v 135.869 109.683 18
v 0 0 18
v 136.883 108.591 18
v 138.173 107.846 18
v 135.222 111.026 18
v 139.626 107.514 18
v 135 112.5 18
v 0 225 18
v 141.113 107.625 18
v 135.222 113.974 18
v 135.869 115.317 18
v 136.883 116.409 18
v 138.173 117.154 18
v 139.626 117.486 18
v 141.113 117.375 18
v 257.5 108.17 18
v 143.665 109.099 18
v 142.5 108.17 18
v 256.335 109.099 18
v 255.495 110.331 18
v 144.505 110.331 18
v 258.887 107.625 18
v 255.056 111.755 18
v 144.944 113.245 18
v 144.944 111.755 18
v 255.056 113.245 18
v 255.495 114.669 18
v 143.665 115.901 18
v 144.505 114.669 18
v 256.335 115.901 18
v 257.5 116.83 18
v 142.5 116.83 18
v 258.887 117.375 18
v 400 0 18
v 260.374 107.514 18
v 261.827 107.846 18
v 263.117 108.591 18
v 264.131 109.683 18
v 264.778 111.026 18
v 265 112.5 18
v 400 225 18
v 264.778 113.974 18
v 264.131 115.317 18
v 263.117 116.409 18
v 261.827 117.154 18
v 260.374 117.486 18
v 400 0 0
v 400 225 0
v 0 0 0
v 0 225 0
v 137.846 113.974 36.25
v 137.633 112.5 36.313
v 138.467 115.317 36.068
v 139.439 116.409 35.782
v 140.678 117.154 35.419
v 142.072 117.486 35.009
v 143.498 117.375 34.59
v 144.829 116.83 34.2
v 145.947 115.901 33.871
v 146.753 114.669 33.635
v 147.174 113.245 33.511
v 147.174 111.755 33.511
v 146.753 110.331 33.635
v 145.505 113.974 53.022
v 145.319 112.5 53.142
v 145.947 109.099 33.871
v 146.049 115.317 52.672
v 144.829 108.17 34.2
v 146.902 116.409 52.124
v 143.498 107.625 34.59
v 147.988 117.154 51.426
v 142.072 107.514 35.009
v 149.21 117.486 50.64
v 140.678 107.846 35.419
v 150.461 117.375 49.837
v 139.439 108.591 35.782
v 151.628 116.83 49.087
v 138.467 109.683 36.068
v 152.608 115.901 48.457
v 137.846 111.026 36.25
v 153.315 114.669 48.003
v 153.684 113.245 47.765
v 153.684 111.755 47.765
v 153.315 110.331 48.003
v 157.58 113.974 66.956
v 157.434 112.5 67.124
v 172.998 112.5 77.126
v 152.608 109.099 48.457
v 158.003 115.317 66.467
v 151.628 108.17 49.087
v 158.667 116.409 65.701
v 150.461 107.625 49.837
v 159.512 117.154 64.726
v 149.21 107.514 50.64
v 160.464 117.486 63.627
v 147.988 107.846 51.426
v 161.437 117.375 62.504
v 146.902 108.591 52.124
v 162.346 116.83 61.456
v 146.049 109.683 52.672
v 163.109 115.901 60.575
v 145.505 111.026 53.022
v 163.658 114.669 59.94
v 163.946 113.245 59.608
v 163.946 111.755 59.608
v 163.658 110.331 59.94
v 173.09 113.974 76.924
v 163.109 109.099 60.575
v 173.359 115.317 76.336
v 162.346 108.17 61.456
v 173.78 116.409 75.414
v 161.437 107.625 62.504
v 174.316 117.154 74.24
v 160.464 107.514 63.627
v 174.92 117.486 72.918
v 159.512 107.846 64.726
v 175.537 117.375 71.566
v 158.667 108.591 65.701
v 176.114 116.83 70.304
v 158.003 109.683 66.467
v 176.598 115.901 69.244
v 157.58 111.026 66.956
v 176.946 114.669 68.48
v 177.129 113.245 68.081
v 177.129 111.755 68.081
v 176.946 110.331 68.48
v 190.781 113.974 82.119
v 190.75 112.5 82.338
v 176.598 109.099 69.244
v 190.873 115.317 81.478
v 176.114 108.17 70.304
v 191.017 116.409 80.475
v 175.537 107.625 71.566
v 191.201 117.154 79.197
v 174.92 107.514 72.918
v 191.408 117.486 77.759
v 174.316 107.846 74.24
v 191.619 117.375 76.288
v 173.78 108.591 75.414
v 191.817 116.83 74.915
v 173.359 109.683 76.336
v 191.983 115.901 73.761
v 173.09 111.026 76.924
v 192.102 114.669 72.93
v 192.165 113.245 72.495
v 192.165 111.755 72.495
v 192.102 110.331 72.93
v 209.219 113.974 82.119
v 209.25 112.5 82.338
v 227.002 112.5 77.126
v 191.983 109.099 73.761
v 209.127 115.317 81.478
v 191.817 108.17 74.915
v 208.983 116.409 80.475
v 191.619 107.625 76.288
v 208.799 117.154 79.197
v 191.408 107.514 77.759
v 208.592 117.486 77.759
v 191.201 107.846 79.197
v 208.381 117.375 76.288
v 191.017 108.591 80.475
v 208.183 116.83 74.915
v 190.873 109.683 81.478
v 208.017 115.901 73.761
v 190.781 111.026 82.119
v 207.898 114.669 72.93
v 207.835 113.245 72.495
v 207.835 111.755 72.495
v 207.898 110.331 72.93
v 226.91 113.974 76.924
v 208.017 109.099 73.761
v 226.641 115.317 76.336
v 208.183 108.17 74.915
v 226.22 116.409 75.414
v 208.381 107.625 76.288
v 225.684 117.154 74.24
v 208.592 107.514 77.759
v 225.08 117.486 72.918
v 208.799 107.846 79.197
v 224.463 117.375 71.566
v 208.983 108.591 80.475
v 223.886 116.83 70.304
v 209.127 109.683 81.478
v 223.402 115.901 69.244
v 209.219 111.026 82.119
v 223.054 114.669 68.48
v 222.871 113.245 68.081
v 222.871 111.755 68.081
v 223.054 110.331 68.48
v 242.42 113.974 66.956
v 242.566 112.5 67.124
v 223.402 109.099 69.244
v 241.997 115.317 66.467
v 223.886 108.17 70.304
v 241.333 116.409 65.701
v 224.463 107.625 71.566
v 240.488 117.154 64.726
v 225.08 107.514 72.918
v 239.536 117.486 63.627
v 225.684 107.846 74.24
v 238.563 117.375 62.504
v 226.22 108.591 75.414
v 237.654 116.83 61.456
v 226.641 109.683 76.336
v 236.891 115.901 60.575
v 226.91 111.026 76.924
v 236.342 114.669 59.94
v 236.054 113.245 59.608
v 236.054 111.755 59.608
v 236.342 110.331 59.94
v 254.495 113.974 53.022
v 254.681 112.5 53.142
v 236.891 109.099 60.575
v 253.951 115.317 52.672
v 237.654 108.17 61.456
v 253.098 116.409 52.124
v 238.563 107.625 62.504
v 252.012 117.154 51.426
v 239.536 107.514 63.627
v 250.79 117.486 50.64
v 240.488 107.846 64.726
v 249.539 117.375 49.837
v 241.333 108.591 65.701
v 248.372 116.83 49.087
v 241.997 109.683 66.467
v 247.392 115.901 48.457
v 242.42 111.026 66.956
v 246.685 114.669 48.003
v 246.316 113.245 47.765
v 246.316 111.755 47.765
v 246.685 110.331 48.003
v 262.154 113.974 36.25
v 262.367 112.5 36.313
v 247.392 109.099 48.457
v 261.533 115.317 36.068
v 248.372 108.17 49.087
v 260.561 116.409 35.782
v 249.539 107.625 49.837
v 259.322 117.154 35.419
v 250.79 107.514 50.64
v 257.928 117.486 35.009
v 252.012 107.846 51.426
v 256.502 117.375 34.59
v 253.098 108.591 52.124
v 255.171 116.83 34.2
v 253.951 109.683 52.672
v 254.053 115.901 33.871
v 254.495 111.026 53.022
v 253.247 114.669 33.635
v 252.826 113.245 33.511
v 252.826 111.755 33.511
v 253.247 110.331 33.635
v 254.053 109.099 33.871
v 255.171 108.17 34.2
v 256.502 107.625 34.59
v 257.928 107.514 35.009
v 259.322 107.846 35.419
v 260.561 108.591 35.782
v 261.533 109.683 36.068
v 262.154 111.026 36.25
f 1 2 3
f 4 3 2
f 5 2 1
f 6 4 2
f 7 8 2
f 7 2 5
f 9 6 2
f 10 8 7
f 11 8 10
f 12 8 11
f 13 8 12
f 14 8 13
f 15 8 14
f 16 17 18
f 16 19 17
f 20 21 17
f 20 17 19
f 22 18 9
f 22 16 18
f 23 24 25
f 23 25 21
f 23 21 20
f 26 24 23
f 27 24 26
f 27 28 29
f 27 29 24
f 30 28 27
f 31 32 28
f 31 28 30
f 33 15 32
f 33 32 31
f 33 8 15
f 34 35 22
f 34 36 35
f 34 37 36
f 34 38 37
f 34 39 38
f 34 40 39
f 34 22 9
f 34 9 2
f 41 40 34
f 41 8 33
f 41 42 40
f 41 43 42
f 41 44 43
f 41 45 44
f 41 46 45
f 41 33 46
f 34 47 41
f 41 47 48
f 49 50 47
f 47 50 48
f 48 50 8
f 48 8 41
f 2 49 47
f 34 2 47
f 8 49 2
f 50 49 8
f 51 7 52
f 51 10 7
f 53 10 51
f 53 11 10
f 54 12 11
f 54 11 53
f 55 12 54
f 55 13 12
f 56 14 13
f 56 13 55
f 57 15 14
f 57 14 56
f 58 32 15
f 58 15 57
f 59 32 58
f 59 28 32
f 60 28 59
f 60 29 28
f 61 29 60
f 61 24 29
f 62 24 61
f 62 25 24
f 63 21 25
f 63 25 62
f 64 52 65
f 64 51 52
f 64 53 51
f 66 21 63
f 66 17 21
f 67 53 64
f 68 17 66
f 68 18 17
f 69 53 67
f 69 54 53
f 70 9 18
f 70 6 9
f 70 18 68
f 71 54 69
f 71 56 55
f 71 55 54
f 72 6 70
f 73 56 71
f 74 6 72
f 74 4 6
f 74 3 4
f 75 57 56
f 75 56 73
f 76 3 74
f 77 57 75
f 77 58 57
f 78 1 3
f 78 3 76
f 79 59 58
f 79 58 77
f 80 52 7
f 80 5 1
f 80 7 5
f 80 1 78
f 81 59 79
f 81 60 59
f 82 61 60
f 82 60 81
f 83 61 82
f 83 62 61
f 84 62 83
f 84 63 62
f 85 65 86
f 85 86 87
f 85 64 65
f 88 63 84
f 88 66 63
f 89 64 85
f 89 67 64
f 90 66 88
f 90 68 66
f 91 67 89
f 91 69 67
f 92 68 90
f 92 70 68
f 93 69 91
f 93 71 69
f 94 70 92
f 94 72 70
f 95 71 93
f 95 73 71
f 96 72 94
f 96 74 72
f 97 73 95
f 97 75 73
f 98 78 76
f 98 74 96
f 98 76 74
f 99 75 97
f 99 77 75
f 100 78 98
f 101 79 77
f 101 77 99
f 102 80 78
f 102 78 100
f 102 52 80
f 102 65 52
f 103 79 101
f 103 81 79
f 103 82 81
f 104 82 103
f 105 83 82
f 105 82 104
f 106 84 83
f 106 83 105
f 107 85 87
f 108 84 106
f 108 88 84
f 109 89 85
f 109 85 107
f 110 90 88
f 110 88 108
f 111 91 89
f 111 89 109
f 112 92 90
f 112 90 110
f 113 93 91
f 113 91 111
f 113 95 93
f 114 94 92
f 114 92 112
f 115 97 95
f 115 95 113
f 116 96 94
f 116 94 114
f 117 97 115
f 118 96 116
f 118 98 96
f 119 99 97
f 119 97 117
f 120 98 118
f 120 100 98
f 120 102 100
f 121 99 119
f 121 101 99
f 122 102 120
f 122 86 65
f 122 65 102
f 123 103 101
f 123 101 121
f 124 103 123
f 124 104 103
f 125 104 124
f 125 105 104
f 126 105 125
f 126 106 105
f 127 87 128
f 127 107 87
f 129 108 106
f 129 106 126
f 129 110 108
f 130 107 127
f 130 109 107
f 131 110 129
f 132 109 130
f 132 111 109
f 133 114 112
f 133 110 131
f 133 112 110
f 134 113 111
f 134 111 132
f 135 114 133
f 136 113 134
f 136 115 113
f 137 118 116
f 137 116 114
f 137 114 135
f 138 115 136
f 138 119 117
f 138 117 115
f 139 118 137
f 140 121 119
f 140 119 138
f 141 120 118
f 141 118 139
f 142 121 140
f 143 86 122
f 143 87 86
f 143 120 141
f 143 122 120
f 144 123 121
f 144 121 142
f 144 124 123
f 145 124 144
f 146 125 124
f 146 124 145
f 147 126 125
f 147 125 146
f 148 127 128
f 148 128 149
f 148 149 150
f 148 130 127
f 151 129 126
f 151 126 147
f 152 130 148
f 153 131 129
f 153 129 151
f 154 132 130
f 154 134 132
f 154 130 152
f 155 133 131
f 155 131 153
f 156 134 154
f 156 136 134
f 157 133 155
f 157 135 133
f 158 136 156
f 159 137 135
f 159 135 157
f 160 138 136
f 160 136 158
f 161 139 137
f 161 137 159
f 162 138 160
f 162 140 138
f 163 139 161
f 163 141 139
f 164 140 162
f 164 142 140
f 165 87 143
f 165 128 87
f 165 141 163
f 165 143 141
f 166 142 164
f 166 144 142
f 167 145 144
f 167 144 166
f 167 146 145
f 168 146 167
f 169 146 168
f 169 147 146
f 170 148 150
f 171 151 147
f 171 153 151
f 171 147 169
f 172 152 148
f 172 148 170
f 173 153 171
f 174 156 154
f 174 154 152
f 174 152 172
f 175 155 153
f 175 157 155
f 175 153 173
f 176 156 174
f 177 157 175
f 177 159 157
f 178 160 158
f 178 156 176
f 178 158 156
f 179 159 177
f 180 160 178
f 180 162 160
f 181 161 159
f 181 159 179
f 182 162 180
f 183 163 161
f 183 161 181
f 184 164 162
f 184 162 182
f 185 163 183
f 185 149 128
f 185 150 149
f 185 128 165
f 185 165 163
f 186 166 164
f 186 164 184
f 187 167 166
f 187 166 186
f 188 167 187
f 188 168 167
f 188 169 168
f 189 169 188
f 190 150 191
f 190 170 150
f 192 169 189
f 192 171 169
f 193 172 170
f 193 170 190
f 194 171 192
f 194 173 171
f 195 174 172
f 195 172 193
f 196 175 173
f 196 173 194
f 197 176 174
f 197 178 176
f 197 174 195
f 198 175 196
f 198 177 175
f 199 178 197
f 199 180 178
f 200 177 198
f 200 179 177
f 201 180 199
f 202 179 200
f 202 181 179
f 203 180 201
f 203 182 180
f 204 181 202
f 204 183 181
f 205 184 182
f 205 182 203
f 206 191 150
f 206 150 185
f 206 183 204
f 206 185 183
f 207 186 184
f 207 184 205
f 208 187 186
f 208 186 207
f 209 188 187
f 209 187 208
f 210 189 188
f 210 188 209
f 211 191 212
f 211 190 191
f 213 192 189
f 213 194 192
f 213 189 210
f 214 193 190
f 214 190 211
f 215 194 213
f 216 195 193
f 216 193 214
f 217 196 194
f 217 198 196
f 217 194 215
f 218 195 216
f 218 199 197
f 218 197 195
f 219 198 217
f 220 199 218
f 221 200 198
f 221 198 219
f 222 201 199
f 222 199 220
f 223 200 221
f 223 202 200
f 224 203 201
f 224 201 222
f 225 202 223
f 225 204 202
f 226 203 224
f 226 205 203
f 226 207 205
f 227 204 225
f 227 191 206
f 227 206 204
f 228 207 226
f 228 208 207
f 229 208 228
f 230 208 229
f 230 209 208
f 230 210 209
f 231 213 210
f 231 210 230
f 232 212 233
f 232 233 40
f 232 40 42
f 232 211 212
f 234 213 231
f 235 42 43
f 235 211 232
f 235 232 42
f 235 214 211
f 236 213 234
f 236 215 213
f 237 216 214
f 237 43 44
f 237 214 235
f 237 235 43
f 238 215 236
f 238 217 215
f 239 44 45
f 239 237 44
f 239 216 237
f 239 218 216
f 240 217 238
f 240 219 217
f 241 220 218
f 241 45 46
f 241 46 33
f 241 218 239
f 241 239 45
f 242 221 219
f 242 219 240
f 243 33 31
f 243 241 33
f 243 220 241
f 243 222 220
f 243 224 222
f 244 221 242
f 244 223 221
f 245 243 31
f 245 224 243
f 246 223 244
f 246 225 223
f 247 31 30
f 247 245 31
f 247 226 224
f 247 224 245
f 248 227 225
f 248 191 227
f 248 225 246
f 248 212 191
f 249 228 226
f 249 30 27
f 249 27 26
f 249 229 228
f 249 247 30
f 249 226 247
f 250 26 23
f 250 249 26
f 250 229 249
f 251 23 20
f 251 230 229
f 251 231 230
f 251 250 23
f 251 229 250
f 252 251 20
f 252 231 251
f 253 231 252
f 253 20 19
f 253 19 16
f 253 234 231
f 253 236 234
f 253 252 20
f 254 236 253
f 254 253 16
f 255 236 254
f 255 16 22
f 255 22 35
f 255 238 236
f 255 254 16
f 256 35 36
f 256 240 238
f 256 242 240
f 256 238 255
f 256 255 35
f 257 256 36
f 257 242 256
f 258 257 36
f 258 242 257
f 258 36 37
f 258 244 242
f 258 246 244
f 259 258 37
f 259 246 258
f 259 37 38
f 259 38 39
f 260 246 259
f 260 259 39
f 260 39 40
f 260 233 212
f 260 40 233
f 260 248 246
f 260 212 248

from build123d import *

# Parameters (mm, degrees)
SKETCH1_W           = 400
SKETCH1_H           = 225
BOSS_EXTRUDE1_DEPTH = 18
SWEEP1_OUTLINE_R    = 5
SWEEP1_ANGLE        = 180


# Read off the part's stored shape, not the designer's step: Sweep1
with BuildPart() as part:
    # Sketch1 → Boss-Extrude1 (new body)
    with BuildSketch(Plane.XY):
        with Locations((200, 112.5)):
            Rectangle(SKETCH1_W, SKETCH1_H)
    extrude(amount=BOSS_EXTRUDE1_DEPTH)

    # Sweep1 outline → Sweep1 (revolve)
    with BuildSketch(Plane(origin=(200, 0, 18), x_dir=(-1, 0, 0), z_dir=(0, 0, -1))):
        with Locations((60, 112.5)):
            Circle(SWEEP1_OUTLINE_R)
    revolve(axis=Axis((200, 0, 18), (0, 1, 0)), revolution_arc=SWEEP1_ANGLE)


solid = part.part
